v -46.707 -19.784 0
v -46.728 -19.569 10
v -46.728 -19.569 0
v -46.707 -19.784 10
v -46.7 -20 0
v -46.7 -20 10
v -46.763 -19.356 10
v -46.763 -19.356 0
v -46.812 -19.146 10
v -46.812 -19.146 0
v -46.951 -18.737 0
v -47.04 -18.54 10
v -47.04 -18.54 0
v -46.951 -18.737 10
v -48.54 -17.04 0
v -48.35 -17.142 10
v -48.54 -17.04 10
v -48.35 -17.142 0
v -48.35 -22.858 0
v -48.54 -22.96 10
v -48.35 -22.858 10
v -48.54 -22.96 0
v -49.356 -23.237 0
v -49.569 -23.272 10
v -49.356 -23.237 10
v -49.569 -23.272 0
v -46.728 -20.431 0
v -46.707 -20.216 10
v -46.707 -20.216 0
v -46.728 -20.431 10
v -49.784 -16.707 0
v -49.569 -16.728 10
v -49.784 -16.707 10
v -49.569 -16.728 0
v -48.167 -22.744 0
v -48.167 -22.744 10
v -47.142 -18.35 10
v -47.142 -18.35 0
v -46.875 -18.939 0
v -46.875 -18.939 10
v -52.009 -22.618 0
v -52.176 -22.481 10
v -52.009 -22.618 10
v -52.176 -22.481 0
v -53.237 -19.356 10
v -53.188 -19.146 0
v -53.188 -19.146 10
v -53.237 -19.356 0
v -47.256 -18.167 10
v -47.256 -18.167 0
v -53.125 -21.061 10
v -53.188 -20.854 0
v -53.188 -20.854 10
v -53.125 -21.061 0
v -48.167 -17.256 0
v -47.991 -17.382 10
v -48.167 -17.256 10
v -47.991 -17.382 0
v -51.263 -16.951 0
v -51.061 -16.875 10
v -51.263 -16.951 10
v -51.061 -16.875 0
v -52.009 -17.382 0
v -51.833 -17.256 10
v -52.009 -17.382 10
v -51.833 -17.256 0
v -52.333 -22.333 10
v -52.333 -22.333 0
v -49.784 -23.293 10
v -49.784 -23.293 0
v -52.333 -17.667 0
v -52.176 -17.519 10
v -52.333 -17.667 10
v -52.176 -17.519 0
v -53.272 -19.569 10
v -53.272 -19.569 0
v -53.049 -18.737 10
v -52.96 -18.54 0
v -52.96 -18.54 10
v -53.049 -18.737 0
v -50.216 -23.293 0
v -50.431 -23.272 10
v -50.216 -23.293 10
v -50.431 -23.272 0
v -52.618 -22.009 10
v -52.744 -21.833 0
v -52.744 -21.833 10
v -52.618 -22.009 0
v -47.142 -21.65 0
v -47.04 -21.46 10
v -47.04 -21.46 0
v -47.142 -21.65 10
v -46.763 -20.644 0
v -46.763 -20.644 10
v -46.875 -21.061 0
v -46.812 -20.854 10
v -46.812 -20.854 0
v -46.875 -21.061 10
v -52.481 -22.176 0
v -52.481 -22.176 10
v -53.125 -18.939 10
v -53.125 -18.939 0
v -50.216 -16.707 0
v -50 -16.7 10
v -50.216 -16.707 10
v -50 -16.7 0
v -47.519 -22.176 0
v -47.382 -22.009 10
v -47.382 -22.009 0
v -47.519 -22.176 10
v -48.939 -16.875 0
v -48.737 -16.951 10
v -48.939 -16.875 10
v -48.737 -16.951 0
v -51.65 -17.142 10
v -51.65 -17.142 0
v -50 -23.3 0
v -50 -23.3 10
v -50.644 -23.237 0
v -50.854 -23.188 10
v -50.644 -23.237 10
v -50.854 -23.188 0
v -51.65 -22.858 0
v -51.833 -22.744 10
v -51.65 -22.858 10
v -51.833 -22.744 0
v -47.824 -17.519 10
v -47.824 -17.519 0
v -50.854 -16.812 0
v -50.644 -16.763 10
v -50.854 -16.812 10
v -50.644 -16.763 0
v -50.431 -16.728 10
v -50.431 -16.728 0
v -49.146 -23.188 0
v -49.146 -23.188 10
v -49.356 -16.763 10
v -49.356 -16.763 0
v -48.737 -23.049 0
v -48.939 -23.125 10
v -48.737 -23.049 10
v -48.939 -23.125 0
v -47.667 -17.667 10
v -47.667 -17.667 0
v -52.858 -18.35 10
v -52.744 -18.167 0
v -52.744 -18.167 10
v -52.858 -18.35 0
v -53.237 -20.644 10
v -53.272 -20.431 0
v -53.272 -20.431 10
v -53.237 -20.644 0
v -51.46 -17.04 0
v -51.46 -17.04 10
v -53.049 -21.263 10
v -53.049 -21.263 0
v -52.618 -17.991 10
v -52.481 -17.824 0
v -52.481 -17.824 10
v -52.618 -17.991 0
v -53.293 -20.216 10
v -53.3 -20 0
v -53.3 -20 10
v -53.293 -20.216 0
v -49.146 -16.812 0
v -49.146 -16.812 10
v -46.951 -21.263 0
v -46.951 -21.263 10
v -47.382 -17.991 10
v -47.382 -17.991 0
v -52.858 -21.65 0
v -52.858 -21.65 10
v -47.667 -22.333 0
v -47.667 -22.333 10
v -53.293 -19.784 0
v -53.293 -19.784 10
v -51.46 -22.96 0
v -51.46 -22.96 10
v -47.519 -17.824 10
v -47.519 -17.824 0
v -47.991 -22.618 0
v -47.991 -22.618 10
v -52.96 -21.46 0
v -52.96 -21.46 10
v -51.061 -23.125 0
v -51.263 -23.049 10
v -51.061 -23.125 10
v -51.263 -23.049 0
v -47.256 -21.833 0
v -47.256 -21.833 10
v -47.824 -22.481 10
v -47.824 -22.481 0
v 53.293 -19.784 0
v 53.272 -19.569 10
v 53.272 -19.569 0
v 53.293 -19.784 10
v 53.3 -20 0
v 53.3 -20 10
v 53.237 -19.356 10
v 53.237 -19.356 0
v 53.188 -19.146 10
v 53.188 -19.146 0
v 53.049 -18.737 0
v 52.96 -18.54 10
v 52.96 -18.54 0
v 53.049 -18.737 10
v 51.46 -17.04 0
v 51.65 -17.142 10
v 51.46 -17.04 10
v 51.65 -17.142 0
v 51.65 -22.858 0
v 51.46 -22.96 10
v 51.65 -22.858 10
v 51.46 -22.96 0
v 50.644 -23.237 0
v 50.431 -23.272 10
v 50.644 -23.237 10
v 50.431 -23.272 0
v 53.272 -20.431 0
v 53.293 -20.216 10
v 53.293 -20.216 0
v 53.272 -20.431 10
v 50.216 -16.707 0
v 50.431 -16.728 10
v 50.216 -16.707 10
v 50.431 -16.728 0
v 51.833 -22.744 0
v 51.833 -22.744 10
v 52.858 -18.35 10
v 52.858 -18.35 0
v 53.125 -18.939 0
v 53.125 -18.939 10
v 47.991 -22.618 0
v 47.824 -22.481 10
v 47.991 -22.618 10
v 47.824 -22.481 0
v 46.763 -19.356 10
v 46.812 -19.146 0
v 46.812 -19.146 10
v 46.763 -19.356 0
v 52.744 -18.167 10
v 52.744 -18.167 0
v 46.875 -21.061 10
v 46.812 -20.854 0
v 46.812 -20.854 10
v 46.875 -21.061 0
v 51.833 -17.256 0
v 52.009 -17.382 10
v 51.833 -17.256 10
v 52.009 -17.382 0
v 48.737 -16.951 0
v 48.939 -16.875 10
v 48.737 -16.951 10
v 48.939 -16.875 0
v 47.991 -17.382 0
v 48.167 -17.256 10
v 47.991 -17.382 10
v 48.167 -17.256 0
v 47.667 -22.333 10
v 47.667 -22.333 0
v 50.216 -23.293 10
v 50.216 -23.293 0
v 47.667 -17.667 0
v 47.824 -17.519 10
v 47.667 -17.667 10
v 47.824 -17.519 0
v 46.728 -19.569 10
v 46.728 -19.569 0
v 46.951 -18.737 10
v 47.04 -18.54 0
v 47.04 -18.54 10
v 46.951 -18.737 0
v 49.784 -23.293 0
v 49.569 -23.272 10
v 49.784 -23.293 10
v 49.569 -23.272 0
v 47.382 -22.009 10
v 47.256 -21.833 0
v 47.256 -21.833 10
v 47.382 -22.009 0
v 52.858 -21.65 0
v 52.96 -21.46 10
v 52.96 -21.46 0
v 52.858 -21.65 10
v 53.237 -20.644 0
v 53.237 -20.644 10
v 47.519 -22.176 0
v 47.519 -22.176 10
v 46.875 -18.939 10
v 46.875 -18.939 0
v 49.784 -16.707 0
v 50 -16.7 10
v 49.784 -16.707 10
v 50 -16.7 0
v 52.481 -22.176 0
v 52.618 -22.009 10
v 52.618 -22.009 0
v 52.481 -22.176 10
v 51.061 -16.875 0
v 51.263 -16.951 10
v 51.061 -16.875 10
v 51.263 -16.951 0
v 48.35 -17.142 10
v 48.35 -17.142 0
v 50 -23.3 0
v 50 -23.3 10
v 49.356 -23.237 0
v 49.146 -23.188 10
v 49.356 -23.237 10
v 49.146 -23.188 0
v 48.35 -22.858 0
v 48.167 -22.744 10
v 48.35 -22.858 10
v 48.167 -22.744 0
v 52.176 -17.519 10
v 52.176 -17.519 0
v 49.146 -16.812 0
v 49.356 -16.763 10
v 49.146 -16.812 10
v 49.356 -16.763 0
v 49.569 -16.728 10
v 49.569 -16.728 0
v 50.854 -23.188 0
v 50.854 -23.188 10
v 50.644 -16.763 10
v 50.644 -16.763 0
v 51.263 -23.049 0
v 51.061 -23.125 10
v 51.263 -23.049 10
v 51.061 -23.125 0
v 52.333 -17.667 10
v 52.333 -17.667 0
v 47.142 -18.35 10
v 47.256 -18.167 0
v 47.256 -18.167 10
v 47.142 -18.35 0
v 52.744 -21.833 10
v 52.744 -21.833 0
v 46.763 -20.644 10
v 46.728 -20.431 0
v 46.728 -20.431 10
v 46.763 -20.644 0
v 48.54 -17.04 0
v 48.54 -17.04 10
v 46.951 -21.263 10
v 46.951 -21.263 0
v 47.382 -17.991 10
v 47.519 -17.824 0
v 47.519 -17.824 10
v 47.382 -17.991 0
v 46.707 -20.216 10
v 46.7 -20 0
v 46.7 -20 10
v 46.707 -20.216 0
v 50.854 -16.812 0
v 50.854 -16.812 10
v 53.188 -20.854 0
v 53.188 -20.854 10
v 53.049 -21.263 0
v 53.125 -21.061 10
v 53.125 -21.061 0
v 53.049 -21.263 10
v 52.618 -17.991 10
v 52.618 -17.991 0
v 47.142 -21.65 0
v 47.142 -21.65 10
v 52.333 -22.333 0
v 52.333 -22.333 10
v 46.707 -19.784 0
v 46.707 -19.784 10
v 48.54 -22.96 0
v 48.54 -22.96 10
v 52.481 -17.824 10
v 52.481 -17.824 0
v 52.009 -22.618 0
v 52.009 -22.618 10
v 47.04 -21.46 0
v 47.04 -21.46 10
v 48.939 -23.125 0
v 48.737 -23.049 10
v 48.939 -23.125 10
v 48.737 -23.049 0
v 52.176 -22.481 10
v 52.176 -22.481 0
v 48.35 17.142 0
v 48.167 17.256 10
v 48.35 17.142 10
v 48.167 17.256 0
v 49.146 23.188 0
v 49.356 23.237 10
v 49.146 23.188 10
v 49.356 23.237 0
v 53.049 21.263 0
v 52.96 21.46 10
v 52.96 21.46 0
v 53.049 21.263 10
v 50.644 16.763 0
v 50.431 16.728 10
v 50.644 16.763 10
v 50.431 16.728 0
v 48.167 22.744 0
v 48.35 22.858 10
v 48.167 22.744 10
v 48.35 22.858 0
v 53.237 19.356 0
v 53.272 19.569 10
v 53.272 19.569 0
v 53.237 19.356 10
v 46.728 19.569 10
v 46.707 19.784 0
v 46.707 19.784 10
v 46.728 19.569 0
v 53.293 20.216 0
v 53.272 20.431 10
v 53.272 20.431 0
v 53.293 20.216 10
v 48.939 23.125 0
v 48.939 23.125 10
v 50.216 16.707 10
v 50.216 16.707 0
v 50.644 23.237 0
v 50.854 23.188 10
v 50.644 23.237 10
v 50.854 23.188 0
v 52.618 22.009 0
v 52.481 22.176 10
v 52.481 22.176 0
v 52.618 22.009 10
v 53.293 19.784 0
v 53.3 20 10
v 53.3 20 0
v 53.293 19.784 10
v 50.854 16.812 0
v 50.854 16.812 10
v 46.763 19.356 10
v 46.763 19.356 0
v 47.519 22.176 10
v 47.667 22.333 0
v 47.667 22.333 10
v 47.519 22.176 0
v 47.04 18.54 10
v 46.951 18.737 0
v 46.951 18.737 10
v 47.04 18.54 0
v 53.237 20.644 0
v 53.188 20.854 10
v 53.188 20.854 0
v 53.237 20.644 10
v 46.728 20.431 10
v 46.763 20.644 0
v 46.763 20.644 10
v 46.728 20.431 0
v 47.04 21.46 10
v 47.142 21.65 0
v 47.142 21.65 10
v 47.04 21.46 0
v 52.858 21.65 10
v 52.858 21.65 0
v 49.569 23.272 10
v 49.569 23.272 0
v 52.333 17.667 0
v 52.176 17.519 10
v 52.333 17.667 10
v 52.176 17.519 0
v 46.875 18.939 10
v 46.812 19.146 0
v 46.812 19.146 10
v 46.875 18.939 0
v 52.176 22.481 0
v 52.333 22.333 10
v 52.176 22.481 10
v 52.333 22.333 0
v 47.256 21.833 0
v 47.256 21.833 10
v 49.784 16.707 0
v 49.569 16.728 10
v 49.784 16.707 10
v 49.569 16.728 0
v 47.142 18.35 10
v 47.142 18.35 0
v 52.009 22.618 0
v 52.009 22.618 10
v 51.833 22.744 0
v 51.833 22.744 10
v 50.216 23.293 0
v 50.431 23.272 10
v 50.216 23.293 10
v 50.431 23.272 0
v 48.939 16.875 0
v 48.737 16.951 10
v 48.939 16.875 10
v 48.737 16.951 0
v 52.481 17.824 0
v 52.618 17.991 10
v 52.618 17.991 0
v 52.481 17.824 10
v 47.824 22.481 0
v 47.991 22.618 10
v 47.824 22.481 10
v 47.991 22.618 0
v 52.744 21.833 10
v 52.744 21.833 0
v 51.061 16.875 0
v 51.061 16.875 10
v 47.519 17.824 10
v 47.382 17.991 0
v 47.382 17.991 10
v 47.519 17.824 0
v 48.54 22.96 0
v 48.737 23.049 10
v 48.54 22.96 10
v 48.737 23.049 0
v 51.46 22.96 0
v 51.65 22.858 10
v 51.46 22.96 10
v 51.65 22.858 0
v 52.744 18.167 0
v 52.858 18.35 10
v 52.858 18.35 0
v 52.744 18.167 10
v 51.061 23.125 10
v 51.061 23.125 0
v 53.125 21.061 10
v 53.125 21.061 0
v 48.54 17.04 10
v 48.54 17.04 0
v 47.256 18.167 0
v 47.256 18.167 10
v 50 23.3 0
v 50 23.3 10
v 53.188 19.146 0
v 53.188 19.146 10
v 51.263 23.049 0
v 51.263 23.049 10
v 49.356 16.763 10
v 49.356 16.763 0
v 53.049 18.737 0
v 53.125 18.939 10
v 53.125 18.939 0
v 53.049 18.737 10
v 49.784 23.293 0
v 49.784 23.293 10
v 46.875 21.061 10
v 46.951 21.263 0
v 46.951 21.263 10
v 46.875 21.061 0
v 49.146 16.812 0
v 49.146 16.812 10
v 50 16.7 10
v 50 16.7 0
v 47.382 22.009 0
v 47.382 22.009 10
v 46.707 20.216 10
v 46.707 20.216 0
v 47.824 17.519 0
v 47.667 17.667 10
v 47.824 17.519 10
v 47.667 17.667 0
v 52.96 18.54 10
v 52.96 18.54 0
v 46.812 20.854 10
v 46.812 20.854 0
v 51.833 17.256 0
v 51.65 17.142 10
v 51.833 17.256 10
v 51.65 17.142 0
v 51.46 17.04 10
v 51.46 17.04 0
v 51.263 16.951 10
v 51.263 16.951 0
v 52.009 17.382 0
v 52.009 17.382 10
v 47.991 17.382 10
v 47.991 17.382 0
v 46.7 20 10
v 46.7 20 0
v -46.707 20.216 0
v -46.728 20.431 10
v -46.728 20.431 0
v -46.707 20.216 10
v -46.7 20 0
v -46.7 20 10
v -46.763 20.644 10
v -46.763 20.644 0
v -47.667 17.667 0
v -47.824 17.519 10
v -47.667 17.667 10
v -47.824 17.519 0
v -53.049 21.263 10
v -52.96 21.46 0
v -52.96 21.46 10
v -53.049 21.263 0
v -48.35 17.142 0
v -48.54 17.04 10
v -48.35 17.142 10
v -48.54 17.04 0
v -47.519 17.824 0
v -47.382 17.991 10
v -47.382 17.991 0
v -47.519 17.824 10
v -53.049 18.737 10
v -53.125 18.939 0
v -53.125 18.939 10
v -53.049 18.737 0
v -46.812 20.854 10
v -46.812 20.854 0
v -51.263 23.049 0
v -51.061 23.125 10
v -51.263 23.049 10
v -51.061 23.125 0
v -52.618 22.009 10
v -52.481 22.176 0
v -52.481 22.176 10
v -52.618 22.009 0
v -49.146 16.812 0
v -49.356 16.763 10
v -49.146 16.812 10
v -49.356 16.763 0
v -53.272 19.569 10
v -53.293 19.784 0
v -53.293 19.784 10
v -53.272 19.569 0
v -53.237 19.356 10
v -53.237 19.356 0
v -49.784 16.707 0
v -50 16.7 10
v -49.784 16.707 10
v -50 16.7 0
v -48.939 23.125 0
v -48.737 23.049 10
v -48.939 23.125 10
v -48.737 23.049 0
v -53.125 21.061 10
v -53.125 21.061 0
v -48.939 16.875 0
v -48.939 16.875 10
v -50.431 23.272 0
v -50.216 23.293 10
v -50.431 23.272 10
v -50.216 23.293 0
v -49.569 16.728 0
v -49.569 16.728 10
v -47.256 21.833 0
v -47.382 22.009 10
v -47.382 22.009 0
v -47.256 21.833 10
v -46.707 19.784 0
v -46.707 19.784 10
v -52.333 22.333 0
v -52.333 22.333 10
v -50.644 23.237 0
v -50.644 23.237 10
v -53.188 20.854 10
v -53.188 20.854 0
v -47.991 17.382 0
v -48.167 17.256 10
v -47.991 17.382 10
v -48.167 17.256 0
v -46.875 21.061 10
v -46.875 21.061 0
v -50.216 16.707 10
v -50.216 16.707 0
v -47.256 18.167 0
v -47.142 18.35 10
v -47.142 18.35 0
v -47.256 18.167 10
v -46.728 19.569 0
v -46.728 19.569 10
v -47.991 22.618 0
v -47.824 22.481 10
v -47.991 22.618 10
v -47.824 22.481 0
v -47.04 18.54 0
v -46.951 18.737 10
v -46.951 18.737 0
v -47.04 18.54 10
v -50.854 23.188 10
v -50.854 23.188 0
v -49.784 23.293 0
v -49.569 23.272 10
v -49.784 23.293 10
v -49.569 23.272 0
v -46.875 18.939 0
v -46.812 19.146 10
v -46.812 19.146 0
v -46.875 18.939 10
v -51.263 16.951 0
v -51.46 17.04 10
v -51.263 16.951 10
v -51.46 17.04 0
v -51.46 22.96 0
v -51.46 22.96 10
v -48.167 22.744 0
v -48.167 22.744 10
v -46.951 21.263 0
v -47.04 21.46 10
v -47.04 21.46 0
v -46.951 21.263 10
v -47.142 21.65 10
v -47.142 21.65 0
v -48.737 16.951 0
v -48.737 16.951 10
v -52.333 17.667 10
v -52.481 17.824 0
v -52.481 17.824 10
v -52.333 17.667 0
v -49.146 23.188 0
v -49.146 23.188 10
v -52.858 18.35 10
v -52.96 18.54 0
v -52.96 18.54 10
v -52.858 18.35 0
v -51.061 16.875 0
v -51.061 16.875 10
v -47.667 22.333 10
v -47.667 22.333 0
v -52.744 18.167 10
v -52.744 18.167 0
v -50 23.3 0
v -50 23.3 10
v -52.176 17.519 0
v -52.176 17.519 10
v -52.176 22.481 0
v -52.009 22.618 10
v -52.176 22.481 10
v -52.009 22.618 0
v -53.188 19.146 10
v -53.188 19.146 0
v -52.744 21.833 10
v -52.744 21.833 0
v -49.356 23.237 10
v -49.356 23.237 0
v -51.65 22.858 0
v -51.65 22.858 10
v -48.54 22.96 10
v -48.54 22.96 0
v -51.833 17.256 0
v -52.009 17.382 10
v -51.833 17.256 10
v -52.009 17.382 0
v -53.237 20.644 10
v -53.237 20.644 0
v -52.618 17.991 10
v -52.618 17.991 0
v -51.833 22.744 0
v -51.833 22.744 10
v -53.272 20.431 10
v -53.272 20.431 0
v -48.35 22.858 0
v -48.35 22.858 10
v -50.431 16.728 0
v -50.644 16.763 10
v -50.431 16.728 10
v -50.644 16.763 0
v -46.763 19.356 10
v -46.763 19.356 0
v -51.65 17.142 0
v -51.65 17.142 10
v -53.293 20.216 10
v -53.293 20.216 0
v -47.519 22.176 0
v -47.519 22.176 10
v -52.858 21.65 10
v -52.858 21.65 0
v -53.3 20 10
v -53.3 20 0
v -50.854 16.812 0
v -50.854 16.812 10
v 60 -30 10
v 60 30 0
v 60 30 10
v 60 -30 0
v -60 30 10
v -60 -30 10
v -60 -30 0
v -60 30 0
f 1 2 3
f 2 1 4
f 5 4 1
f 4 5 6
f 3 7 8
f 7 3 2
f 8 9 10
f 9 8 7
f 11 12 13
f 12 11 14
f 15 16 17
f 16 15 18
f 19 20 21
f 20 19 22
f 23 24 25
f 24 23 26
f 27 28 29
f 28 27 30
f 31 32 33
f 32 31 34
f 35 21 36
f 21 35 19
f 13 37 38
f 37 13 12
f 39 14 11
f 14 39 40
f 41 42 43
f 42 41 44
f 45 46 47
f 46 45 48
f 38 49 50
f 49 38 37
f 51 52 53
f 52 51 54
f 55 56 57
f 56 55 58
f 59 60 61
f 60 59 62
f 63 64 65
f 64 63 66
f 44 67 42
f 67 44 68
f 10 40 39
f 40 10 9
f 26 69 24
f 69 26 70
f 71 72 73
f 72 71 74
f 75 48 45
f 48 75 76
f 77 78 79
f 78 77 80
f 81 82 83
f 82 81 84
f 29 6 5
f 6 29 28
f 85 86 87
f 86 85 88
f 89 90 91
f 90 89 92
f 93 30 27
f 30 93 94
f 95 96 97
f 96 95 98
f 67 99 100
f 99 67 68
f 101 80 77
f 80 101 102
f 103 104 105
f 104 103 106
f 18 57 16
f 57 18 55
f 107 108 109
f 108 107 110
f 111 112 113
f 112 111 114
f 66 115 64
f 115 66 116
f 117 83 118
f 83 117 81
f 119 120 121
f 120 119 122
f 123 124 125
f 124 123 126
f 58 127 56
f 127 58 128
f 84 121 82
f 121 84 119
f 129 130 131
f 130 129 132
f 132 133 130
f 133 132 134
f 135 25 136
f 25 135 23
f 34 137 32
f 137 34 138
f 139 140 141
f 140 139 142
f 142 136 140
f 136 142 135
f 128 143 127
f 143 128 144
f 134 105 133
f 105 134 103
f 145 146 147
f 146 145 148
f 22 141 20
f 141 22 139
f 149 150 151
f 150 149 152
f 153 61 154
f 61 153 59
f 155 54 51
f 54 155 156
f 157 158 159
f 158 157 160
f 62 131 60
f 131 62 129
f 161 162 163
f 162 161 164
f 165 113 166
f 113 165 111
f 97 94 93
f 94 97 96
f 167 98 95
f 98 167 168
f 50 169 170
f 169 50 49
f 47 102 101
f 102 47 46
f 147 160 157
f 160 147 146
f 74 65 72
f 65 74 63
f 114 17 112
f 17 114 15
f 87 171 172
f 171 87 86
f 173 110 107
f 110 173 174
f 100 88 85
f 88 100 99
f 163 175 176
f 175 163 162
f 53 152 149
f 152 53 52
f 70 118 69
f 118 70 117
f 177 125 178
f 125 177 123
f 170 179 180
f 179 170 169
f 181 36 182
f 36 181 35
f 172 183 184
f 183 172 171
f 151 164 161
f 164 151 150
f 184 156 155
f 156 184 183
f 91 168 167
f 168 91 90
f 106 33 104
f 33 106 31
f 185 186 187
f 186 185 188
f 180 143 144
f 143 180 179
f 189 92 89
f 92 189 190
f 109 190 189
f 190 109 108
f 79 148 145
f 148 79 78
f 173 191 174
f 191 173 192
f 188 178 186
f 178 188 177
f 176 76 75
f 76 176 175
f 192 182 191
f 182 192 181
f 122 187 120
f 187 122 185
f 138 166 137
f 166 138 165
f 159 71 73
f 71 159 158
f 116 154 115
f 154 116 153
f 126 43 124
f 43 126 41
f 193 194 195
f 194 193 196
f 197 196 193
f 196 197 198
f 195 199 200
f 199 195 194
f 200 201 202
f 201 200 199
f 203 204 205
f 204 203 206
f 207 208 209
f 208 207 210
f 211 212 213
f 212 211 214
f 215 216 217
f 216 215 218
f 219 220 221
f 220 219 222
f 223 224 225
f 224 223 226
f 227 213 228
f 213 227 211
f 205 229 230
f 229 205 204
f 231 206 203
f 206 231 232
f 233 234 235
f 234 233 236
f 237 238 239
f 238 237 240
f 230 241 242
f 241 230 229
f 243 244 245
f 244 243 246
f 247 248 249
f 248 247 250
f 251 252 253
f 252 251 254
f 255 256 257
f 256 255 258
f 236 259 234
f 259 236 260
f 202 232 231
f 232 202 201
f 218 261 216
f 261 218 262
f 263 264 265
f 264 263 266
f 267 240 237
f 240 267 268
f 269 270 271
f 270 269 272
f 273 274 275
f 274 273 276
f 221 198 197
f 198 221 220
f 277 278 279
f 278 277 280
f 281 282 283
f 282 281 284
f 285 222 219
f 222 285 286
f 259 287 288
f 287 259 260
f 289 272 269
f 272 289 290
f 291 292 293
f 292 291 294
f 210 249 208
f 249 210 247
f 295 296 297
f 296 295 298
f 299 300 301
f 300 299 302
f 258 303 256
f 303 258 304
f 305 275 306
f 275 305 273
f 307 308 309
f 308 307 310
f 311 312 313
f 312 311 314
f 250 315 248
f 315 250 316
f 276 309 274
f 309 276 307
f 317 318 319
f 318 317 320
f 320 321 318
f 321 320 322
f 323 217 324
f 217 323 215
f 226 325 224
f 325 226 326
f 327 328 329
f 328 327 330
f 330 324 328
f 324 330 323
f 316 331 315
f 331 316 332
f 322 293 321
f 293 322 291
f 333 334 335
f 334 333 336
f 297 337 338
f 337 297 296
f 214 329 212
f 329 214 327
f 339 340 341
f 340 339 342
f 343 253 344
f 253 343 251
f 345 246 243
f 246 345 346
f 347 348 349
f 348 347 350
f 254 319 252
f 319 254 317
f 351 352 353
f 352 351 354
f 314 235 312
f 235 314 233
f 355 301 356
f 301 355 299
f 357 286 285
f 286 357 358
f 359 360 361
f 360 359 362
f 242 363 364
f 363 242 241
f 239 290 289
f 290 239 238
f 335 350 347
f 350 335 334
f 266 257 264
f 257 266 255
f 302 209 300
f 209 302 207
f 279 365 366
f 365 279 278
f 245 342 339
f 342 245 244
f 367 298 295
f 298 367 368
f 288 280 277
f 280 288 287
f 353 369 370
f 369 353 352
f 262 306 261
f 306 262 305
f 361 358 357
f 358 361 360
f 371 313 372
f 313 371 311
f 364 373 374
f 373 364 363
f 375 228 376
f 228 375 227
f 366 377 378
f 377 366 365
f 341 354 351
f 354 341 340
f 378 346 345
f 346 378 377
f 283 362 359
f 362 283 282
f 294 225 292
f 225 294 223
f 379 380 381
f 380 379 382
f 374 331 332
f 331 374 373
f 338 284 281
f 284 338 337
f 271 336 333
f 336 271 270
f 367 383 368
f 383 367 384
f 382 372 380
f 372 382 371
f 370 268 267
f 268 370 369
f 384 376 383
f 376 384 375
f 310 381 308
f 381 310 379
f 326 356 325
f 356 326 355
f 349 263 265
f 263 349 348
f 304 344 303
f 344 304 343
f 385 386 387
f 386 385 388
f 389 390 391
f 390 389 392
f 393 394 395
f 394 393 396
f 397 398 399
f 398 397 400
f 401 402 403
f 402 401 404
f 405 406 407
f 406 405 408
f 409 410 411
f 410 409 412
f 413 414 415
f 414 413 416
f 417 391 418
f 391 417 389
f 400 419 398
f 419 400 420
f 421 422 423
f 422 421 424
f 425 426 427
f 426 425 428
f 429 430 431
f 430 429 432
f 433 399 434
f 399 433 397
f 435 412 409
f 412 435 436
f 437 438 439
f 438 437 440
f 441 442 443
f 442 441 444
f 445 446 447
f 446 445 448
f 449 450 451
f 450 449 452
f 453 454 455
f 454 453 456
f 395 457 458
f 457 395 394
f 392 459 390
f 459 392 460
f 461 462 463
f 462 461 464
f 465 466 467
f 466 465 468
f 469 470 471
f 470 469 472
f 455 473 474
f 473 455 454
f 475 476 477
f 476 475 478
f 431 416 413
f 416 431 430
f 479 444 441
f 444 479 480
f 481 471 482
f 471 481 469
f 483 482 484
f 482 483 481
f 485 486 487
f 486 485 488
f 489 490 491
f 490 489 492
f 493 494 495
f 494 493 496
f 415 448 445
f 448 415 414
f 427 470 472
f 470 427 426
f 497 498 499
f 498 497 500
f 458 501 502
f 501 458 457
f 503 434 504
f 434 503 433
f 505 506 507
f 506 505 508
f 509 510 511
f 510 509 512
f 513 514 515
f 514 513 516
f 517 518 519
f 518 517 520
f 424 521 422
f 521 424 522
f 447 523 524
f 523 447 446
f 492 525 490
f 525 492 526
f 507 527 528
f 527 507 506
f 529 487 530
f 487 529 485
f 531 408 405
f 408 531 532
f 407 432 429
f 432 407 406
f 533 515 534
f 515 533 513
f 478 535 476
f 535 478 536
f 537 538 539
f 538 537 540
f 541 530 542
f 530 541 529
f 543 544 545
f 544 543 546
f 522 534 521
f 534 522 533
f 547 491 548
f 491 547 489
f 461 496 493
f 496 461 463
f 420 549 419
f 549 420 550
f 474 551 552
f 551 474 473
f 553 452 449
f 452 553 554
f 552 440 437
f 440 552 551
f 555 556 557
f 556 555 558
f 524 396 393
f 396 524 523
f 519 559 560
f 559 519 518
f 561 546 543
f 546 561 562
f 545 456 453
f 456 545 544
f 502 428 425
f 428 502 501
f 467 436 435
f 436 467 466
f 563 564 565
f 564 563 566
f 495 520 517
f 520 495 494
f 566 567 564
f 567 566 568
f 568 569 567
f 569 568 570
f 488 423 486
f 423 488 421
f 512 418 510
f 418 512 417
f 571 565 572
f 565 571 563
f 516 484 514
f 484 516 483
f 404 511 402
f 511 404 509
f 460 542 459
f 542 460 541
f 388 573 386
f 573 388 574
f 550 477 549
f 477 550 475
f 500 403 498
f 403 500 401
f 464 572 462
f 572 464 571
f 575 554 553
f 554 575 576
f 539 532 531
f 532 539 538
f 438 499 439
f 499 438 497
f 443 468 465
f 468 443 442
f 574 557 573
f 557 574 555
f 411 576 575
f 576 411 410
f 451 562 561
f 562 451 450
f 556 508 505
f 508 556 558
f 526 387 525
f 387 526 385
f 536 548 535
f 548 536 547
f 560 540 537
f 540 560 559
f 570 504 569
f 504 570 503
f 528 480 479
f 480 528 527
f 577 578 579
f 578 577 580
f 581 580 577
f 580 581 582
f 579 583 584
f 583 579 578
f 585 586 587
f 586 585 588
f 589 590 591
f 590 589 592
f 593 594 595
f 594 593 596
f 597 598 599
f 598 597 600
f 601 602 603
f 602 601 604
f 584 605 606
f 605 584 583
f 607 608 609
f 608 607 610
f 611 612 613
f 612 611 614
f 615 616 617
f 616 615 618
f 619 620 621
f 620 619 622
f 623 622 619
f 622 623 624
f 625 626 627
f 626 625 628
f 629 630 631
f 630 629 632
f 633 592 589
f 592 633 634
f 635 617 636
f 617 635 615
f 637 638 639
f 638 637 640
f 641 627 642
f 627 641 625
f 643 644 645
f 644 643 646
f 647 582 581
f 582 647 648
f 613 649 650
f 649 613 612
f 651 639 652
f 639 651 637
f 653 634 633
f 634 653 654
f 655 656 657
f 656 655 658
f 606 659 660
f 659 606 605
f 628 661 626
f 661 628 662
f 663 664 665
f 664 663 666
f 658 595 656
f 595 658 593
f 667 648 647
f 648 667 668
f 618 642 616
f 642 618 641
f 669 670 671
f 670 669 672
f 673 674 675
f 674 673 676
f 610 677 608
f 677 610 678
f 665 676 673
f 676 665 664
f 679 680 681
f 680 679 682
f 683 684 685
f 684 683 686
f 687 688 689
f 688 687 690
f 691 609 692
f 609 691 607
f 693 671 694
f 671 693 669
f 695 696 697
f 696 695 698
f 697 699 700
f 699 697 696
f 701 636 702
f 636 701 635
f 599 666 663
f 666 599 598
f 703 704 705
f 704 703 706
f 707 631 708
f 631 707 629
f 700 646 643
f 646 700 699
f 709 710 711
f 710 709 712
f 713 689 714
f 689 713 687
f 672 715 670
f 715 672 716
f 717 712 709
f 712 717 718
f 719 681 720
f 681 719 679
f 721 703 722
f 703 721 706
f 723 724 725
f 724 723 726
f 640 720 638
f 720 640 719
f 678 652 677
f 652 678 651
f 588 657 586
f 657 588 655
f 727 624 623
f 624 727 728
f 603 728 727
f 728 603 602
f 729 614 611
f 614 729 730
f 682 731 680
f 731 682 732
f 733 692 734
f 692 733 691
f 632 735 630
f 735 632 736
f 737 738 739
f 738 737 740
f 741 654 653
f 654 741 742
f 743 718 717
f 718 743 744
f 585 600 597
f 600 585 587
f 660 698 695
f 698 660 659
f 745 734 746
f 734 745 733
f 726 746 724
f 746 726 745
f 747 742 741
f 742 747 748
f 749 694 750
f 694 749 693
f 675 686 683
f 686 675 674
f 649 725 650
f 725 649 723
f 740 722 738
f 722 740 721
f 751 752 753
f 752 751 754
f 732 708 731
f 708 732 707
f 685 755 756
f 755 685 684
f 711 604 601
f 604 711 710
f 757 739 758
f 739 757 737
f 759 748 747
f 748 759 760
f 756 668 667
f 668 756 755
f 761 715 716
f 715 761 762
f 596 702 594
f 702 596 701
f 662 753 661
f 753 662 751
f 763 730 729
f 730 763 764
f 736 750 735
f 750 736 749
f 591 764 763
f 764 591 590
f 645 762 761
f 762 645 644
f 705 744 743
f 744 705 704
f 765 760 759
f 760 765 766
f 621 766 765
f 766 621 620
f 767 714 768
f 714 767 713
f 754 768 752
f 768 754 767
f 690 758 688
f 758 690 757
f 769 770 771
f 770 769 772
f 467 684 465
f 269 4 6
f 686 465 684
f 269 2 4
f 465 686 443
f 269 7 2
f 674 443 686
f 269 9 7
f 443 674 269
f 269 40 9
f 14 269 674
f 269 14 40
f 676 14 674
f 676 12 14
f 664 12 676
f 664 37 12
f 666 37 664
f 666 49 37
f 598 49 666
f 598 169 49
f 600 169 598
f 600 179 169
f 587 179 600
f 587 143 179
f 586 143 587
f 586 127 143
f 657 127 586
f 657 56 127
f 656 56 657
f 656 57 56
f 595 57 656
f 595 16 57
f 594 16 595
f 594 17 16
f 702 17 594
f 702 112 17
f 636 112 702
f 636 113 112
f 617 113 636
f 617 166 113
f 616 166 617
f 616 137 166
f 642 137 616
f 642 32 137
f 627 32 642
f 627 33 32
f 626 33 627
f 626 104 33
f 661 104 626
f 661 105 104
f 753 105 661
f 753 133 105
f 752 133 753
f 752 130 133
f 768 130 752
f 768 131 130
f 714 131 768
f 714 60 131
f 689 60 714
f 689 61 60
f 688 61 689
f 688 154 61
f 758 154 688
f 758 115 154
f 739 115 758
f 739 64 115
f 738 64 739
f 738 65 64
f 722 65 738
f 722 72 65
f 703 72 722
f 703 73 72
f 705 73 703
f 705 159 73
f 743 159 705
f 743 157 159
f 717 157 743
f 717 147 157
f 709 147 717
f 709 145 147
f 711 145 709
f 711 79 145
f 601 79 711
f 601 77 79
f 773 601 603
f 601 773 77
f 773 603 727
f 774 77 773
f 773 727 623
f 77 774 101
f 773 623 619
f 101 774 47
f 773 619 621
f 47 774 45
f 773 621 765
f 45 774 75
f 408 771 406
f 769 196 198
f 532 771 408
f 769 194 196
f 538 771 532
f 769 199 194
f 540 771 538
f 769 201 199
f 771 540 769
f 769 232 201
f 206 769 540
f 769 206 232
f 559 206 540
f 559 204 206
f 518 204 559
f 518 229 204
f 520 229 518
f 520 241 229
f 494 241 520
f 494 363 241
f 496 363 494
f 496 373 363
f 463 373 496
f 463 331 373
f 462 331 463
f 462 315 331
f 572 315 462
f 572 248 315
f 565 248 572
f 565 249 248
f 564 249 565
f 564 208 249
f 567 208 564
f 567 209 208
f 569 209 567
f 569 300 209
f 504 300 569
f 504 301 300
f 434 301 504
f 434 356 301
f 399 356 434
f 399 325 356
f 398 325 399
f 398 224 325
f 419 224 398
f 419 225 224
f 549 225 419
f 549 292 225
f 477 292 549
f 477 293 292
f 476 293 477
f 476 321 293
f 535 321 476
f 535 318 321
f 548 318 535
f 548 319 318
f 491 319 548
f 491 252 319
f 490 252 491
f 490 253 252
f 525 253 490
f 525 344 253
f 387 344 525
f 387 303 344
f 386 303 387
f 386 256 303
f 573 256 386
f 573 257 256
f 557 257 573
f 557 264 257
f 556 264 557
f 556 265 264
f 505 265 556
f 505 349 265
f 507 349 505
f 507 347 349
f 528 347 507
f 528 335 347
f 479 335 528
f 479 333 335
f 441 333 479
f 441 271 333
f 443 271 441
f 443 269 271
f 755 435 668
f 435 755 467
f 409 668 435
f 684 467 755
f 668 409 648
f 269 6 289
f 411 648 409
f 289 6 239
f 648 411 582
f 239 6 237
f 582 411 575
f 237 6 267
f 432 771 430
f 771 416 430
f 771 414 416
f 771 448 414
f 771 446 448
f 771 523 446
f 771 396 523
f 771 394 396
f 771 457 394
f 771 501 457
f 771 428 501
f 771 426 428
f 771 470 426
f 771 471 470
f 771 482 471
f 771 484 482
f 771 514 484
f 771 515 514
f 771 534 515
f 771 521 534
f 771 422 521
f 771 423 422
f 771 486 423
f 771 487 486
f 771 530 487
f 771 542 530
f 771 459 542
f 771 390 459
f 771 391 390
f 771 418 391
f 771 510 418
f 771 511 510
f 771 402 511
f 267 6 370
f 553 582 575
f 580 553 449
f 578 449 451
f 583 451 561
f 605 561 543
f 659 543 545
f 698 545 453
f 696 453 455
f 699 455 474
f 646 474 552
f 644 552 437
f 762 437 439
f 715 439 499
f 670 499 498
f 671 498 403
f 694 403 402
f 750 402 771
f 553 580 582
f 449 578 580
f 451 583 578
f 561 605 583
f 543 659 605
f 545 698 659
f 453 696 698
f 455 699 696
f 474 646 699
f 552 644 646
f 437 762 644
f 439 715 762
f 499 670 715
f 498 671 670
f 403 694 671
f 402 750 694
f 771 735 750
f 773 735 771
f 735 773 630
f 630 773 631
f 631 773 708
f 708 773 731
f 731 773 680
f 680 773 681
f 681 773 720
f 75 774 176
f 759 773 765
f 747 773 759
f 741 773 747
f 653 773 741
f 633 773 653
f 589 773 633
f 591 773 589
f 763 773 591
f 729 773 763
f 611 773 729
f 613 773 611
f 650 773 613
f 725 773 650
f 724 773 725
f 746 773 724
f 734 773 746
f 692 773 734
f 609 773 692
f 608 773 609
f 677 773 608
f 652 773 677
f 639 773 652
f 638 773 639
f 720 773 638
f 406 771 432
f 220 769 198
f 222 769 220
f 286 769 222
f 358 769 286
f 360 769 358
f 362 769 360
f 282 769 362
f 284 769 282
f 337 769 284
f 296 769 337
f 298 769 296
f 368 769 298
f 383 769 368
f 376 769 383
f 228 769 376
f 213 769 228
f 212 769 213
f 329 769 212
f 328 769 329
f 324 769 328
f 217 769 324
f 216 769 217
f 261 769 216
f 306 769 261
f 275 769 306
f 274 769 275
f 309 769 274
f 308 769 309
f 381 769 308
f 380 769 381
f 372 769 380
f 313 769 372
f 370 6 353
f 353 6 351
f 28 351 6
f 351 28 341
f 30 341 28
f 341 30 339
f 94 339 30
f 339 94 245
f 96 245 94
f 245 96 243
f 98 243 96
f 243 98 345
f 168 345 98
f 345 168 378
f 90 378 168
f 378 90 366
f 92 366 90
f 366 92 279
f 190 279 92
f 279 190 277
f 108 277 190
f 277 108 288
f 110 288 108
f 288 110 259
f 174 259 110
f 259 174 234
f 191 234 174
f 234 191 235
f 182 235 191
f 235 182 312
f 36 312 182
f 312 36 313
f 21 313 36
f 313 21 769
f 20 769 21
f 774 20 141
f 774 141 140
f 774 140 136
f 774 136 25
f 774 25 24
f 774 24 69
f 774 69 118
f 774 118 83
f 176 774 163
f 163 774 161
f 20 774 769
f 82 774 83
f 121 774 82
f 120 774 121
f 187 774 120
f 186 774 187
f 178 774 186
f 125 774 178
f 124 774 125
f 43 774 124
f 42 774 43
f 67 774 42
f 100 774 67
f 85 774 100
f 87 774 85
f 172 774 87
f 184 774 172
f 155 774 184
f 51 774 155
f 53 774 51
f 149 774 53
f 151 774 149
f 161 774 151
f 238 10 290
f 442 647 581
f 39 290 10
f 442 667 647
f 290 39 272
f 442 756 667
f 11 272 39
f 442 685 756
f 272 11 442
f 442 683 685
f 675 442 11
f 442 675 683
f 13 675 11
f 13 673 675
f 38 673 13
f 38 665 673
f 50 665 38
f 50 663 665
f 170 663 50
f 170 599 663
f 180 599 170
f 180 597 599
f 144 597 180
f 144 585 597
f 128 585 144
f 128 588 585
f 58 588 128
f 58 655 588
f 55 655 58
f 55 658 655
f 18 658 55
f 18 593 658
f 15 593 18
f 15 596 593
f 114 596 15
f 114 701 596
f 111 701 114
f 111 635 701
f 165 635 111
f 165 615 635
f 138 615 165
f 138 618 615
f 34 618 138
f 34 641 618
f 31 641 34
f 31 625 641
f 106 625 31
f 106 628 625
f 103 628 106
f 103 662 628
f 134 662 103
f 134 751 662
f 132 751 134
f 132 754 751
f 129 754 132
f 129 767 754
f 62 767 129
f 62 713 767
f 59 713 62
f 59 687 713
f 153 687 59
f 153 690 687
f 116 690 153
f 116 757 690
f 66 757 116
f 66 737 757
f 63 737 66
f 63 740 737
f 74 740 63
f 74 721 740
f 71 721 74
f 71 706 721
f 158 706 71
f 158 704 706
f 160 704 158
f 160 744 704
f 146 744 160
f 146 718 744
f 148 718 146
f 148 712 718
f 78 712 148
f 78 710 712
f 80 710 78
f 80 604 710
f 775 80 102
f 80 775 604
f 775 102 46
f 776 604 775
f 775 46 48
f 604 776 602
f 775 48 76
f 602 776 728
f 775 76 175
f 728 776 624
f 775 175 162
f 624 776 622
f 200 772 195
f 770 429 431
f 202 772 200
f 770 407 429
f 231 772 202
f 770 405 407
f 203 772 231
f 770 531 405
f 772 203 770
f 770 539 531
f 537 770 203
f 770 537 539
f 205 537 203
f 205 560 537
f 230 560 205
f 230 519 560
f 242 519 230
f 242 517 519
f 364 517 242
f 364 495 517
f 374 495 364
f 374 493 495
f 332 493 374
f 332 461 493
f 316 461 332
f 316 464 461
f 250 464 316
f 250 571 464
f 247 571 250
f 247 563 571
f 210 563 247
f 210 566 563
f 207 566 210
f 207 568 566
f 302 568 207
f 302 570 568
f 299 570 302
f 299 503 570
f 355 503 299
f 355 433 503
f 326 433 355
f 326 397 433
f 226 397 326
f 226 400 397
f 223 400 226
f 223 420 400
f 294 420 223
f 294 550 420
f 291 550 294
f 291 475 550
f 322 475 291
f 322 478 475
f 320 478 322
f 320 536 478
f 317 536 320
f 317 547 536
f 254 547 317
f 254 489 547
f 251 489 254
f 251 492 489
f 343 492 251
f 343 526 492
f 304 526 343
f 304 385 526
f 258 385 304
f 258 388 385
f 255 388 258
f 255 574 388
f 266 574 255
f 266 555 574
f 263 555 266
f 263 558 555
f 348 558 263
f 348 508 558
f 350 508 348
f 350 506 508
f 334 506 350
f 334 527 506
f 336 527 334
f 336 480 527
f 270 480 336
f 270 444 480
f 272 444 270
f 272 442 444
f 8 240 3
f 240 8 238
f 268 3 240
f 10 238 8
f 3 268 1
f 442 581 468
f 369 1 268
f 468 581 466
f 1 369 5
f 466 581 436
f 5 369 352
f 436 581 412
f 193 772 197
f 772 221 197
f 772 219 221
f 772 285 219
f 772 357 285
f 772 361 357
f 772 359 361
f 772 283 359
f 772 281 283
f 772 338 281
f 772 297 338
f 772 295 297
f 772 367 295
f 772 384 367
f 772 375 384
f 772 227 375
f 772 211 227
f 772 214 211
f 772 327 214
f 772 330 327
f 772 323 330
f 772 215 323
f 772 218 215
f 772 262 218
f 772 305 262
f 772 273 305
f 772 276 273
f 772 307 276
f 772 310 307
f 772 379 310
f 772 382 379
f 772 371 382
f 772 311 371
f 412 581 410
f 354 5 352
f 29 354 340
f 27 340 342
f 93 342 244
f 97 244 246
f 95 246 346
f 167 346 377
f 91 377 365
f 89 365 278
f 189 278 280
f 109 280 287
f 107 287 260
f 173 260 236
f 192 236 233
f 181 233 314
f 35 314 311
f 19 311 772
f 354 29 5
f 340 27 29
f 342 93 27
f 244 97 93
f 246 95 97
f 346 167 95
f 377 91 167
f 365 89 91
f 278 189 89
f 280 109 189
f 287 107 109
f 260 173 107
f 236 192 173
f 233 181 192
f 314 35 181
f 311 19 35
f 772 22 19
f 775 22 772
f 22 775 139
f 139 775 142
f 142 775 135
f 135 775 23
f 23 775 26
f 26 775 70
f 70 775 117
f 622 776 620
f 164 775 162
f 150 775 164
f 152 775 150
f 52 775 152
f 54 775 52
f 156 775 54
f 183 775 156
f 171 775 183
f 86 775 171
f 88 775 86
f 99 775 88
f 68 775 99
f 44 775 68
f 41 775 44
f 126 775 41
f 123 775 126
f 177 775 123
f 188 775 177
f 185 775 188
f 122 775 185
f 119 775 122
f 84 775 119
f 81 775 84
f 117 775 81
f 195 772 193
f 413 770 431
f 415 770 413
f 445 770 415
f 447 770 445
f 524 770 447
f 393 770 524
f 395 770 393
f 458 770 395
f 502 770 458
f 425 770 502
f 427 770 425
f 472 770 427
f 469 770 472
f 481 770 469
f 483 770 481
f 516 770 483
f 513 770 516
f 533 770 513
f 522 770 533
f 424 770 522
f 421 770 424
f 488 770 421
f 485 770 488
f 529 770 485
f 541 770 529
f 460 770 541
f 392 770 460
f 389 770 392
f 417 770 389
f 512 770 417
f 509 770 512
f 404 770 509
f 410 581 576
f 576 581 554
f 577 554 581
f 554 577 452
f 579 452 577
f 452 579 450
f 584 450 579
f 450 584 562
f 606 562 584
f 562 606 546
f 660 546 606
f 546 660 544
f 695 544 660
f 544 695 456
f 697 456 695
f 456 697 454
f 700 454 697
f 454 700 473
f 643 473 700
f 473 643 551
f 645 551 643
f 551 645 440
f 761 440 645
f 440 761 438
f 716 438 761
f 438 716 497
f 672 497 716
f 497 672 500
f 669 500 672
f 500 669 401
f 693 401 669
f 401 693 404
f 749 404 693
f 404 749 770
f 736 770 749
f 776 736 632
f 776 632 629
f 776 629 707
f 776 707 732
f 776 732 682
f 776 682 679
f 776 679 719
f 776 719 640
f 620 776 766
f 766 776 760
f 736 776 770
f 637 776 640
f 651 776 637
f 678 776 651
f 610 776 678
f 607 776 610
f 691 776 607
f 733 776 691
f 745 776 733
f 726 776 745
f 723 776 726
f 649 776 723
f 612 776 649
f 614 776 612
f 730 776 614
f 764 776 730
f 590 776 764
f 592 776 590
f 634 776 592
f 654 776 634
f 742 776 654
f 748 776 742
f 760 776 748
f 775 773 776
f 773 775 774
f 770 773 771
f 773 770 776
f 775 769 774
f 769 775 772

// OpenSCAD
// Generated by PromptCAD Studio
$fn = 96;

difference() {
  union() {
    translate([-60, -30, 0]) cube([120, 60, 10]);
  }
  union() {
    translate([-50, -20, -1]) rotate([0, 0, 0]) cylinder(d=6.6, h=12);
    translate([50, -20, -1]) rotate([0, 0, 0]) cylinder(d=6.6, h=12);
    translate([50, 20, -1]) rotate([0, 0, 0]) cylinder(d=6.6, h=12);
    translate([-50, 20, -1]) rotate([0, 0, 0]) cylinder(d=6.6, h=12);
  }
}

// Note: fillet/chamfer are preserved in model.py; OpenSCAD fallback does not apply them.
